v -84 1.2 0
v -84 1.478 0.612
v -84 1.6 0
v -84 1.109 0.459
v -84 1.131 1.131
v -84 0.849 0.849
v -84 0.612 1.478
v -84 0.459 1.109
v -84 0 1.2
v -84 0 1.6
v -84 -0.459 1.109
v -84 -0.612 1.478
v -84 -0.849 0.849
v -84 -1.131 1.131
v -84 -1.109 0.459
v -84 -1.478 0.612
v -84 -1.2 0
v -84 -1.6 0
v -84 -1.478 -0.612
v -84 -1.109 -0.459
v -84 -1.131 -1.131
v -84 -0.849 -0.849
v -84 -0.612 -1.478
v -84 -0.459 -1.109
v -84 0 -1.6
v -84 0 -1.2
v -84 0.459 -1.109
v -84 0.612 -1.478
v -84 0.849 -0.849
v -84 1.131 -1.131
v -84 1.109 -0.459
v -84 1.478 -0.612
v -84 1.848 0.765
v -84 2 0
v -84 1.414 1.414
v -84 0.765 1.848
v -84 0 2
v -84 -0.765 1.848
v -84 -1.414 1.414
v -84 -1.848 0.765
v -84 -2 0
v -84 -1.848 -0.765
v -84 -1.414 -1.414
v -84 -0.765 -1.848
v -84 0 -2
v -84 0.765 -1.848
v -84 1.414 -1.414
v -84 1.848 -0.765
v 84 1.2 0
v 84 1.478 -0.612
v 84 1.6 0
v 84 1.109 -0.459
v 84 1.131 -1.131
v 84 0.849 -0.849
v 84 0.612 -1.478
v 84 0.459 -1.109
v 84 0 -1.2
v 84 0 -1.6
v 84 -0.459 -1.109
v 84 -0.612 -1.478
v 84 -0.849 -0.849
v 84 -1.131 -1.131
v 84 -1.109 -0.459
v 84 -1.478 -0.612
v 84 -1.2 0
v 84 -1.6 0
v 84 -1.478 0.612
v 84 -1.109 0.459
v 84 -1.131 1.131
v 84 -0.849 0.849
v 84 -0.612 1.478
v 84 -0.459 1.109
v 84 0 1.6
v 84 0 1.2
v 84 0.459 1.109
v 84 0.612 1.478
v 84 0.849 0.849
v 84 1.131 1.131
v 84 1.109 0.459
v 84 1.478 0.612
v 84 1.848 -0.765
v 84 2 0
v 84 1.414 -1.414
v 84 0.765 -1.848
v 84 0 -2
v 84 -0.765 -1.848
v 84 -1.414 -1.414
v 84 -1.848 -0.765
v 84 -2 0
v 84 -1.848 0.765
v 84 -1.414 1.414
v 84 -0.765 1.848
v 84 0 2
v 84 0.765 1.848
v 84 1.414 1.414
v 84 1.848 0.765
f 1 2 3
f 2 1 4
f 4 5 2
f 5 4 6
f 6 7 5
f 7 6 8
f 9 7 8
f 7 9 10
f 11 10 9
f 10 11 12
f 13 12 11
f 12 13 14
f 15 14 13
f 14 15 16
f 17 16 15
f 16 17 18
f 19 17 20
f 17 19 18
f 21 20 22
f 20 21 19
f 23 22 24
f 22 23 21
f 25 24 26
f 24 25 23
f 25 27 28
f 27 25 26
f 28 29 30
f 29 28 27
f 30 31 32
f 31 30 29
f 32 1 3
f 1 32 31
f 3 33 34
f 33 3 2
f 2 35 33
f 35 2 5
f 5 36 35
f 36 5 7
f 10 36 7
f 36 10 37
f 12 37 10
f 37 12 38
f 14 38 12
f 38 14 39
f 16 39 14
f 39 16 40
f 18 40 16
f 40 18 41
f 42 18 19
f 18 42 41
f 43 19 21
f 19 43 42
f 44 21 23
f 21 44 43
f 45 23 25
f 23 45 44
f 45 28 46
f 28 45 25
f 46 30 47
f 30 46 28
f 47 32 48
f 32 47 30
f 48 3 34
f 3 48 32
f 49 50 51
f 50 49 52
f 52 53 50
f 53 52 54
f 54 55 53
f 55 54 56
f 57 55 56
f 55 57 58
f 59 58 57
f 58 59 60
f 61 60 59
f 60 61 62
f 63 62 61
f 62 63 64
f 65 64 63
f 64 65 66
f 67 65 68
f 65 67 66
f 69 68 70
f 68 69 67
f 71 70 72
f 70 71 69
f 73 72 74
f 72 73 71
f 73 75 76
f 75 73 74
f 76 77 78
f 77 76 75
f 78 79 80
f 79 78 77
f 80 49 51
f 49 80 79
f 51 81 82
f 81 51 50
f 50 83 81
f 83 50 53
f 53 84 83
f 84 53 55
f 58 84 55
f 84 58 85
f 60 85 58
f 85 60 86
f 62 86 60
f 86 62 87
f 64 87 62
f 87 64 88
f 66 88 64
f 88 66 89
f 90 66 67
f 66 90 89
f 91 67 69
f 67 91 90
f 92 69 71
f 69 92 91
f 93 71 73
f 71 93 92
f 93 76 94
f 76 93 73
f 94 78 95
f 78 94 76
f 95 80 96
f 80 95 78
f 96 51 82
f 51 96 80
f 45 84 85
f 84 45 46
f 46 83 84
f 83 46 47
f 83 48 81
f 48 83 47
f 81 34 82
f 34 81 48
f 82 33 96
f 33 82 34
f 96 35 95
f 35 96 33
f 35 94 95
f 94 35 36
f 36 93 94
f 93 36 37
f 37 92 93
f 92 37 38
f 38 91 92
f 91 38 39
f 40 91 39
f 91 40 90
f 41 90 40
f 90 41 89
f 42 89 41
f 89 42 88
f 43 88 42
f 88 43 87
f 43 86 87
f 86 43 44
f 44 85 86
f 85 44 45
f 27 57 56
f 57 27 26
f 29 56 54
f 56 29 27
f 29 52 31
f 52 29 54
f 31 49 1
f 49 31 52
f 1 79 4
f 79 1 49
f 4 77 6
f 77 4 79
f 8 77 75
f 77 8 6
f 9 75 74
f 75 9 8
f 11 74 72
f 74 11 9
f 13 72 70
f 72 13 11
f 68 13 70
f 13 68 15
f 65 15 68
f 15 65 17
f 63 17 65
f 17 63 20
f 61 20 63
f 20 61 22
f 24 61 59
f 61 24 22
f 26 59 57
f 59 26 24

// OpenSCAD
// file: ../p/4-4cyli.scad
use <../lib.scad>
function ldraw_lib__4_4cyli() = [
// 0 Cylinder 1.0
// 0 Name: 4-4cyli.dat
// 0 Author: James Jessiman
// 0 !LDRAW_ORG Primitive UPDATE 2005-01
// 0 !LICENSE Licensed under CC BY 2.0 and CC BY 4.0 : see CAreadme.txt
// 
// 0 BFC CERTIFY CCW
  [0,"BFC","CERTIFY"],
  [0,"BFC","CCW"],
// 
// 0 !HISTORY 1998-12-15 [PTadmin] Official Update 1998-10
// 0 !HISTORY 2002-03-23 [sbliss] Added BFC statement; merged headers from files in distributions LDraw 0.27 and Complete.
// 0 !HISTORY 2002-04-25 [PTadmin] Official Update 2002-02
// 0 !HISTORY 2004-12-14 [guyvivan] BFC CCW
// 0 !HISTORY 2005-12-28 [PTadmin] Official Update 2005-01
// 0 !HISTORY 2007-06-24 [PTadmin] Header formatted for Contributor Agreement
// 0 !HISTORY 2008-07-01 [PTadmin] Official Update 2008-01
// 
// 
// 4 16 1 1 0 0.9239 1 0.3827 0.9239 0 0.3827 1 0 0
  [4,16,1,1,0,0.9239,1,0.3827,0.9239,0,0.3827,1,0,0],
// 5 24 1 0 0 1 1 0 0.9239 0 0.3827 0.9239 0 -0.3827
  [5,24,1,0,0,1,1,0,0.9239,0,0.3827,0.9239,0,-0.3827],
// 4 16 0.9239 1 0.3827 0.7071 1 0.7071 0.7071 0 0.7071 0.9239 0 0.3827
  [4,16,0.9239,1,0.3827,0.7071,1,0.7071,0.7071,0,0.7071,0.9239,0,0.3827],
// 5 24 0.9239 0 0.3827 0.9239 1 0.3827 0.7071 0 0.7071 1 0 0
  [5,24,0.9239,0,0.3827,0.9239,1,0.3827,0.7071,0,0.7071,1,0,0],
// 4 16 0.7071 1 0.7071 0.3827 1 0.9239 0.3827 0 0.9239 0.7071 0 0.7071
  [4,16,0.7071,1,0.7071,0.3827,1,0.9239,0.3827,0,0.9239,0.7071,0,0.7071],
// 5 24 0.7071 0 0.7071 0.7071 1 0.7071 0.3827 0 0.9239 0.9239 0 0.3827
  [5,24,0.7071,0,0.7071,0.7071,1,0.7071,0.3827,0,0.9239,0.9239,0,0.3827],
// 4 16 0.3827 1 0.9239 0 1 1 0 0 1 0.3827 0 0.9239
  [4,16,0.3827,1,0.9239,0,1,1,0,0,1,0.3827,0,0.9239],
// 5 24 0.3827 0 0.9239 0.3827 1 0.9239 0 0 1 0.7071 0 0.7071
  [5,24,0.3827,0,0.9239,0.3827,1,0.9239,0,0,1,0.7071,0,0.7071],
// 4 16 0 1 1 -0.3827 1 0.9239 -0.3827 0 0.9239 0 0 1
  [4,16,0,1,1,-0.3827,1,0.9239,-0.3827,0,0.9239,0,0,1],
// 5 24 0 0 1 0 1 1 -0.3827 0 0.9239 0.3827 0 0.9239
  [5,24,0,0,1,0,1,1,-0.3827,0,0.9239,0.3827,0,0.9239],
// 4 16 -0.3827 1 0.9239 -0.7071 1 0.7071 -0.7071 0 0.7071 -0.3827 0 0.9239
  [4,16,-0.3827,1,0.9239,-0.7071,1,0.7071,-0.7071,0,0.7071,-0.3827,0,0.9239],
// 5 24 -0.3827 0 0.9239 -0.3827 1 0.9239 -0.7071 0 0.7071 0 0 1
  [5,24,-0.3827,0,0.9239,-0.3827,1,0.9239,-0.7071,0,0.7071,0,0,1],
// 4 16 -0.7071 1 0.7071 -0.9239 1 0.3827 -0.9239 0 0.3827 -0.7071 0 0.7071
  [4,16,-0.7071,1,0.7071,-0.9239,1,0.3827,-0.9239,0,0.3827,-0.7071,0,0.7071],
// 5 24 -0.7071 0 0.7071 -0.7071 1 0.7071 -0.9239 0 0.3827 -0.3827 0 0.9239
  [5,24,-0.7071,0,0.7071,-0.7071,1,0.7071,-0.9239,0,0.3827,-0.3827,0,0.9239],
// 4 16 -0.9239 1 0.3827 -1 1 0 -1 0 0 -0.9239 0 0.3827
  [4,16,-0.9239,1,0.3827,-1,1,0,-1,0,0,-0.9239,0,0.3827],
// 5 24 -0.9239 0 0.3827 -0.9239 1 0.3827 -1 0 0 -0.7071 0 0.7071
  [5,24,-0.9239,0,0.3827,-0.9239,1,0.3827,-1,0,0,-0.7071,0,0.7071],
// 4 16 -1 1 0 -0.9239 1 -0.3827 -0.9239 0 -0.3827 -1 0 0
  [4,16,-1,1,0,-0.9239,1,-0.3827,-0.9239,0,-0.3827,-1,0,0],
// 5 24 -1 0 0 -1 1 0 -0.9239 0 -0.3827 -0.9239 0 0.3827
  [5,24,-1,0,0,-1,1,0,-0.9239,0,-0.3827,-0.9239,0,0.3827],
// 4 16 -0.9239 1 -0.3827 -0.7071 1 -0.7071 -0.7071 0 -0.7071 -0.9239 0 -0.3827
  [4,16,-0.9239,1,-0.3827,-0.7071,1,-0.7071,-0.7071,0,-0.7071,-0.9239,0,-0.3827],
// 5 24 -0.9239 0 -0.3827 -0.9239 1 -0.3827 -0.7071 0 -0.7071 -1 0 0
  [5,24,-0.9239,0,-0.3827,-0.9239,1,-0.3827,-0.7071,0,-0.7071,-1,0,0],
// 4 16 -0.7071 1 -0.7071 -0.3827 1 -0.9239 -0.3827 0 -0.9239 -0.7071 0 -0.7071
  [4,16,-0.7071,1,-0.7071,-0.3827,1,-0.9239,-0.3827,0,-0.9239,-0.7071,0,-0.7071],
// 5 24 -0.7071 0 -0.7071 -0.7071 1 -0.7071 -0.3827 0 -0.9239 -0.9239 0 -0.3827
  [5,24,-0.7071,0,-0.7071,-0.7071,1,-0.7071,-0.3827,0,-0.9239,-0.9239,0,-0.3827],
// 4 16 -0.3827 1 -0.9239 0 1 -1 0 0 -1 -0.3827 0 -0.9239
  [4,16,-0.3827,1,-0.9239,0,1,-1,0,0,-1,-0.3827,0,-0.9239],
// 5 24 -0.3827 0 -0.9239 -0.3827 1 -0.9239 0 0 -1 -0.7071 0 -0.7071
  [5,24,-0.3827,0,-0.9239,-0.3827,1,-0.9239,0,0,-1,-0.7071,0,-0.7071],
// 4 16 0 1 -1 0.3827 1 -0.9239 0.3827 0 -0.9239 0 0 -1
  [4,16,0,1,-1,0.3827,1,-0.9239,0.3827,0,-0.9239,0,0,-1],
// 5 24 0 0 -1 0 1 -1 0.3827 0 -0.9239 -0.3827 0 -0.9239
  [5,24,0,0,-1,0,1,-1,0.3827,0,-0.9239,-0.3827,0,-0.9239],
// 4 16 0.3827 1 -0.9239 0.7071 1 -0.7071 0.7071 0 -0.7071 0.3827 0 -0.9239
  [4,16,0.3827,1,-0.9239,0.7071,1,-0.7071,0.7071,0,-0.7071,0.3827,0,-0.9239],
// 5 24 0.3827 0 -0.9239 0.3827 1 -0.9239 0.7071 0 -0.7071 0 0 -1
  [5,24,0.3827,0,-0.9239,0.3827,1,-0.9239,0.7071,0,-0.7071,0,0,-1],
// 4 16 0.7071 1 -0.7071 0.9239 1 -0.3827 0.9239 0 -0.3827 0.7071 0 -0.7071
  [4,16,0.7071,1,-0.7071,0.9239,1,-0.3827,0.9239,0,-0.3827,0.7071,0,-0.7071],
// 5 24 0.7071 0 -0.7071 0.7071 1 -0.7071 0.9239 0 -0.3827 0.3827 0 -0.9239
  [5,24,0.7071,0,-0.7071,0.7071,1,-0.7071,0.9239,0,-0.3827,0.3827,0,-0.9239],
// 4 16 0.9239 1 -0.3827 1 1 0 1 0 0 0.9239 0 -0.3827
  [4,16,0.9239,1,-0.3827,1,1,0,1,0,0,0.9239,0,-0.3827],
// 5 24 0.9239 0 -0.3827 0.9239 1 -0.3827 1 0 0 0.7071 0 -0.7071
  [5,24,0.9239,0,-0.3827,0.9239,1,-0.3827,1,0,0,0.7071,0,-0.7071],
// 0
];
module ldraw_lib__4_4cyli(step=0, col=false, unit=2/5, alt=false, line=0.2, solid=!$preview)
    makepoly(ldraw_lib__4_4cyli(), step=step, col=col, unit=unit, alt=alt, line=line, solid=solid);
ldraw_lib__4_4cyli(line=0.2);
// file: ../p/4-4ring4.scad
use <../lib.scad>
function ldraw_lib__4_4ring4() = [
// 0 Ring  4 x 1.0
// 0 Name: 4-4ring4.dat
// 0 Author: James Jessiman
// 0 !LDRAW_ORG Primitive UPDATE 2009-01
// 0 !LICENSE Licensed under CC BY 2.0 and CC BY 4.0 : see CAreadme.txt
// 
// 0 BFC CERTIFY CCW
  [0,"BFC","CERTIFY"],
  [0,"BFC","CCW"],
// 
// 0 !HISTORY 1998-12-15 [PTadmin] Official Update 1998-10
// 0 !HISTORY 2002-04-08 [BrickCaster] Modified for BFC compliance
// 0 !HISTORY 2002-04-25 [PTadmin] Official Update 2002-02
// 0 !HISTORY 2007-06-24 [PTadmin] Header formatted for Contributor Agreement
// 0 !HISTORY 2008-07-01 [PTadmin] Official Update 2008-01
// 0 !HISTORY 2008-08-26 [cwdee] Switch polygon winding and rename
// 0 !HISTORY 2009-05-02 [PTadmin] Official Update 2009-01
// 
// 
// 4 16 -1.9135 0 4.6195 -1.5308 0 3.6956 0 0 4 0 0 5
  [4,16,-1.9135,0,4.6195,-1.5308,0,3.6956,0,0,4,0,0,5],
// 4 16 -3.5355 0 3.5355 -2.8284 0 2.8284 -1.5308 0 3.6956 -1.9135 0 4.6195
  [4,16,-3.5355,0,3.5355,-2.8284,0,2.8284,-1.5308,0,3.6956,-1.9135,0,4.6195],
// 4 16 -4.6195 0 1.9135 -3.6956 0 1.5308 -2.8284 0 2.8284 -3.5355 0 3.5355
  [4,16,-4.6195,0,1.9135,-3.6956,0,1.5308,-2.8284,0,2.8284,-3.5355,0,3.5355],
// 4 16 -5 0 0 -4 0 0 -3.6956 0 1.5308 -4.6195 0 1.9135
  [4,16,-5,0,0,-4,0,0,-3.6956,0,1.5308,-4.6195,0,1.9135],
// 4 16 -4.6195 0 -1.9135 -3.6956 0 -1.5308 -4 0 0 -5 0 0
  [4,16,-4.6195,0,-1.9135,-3.6956,0,-1.5308,-4,0,0,-5,0,0],
// 4 16 -3.5355 0 -3.5355 -2.8284 0 -2.8284 -3.6956 0 -1.5308 -4.6195 0 -1.9135
  [4,16,-3.5355,0,-3.5355,-2.8284,0,-2.8284,-3.6956,0,-1.5308,-4.6195,0,-1.9135],
// 4 16 -1.9135 0 -4.6195 -1.5308 0 -3.6956 -2.8284 0 -2.8284 -3.5355 0 -3.5355
  [4,16,-1.9135,0,-4.6195,-1.5308,0,-3.6956,-2.8284,0,-2.8284,-3.5355,0,-3.5355],
// 4 16 0 0 -5 0 0 -4 -1.5308 0 -3.6956 -1.9135 0 -4.6195
  [4,16,0,0,-5,0,0,-4,-1.5308,0,-3.6956,-1.9135,0,-4.6195],
// 4 16 1.9135 0 -4.6195 1.5308 0 -3.6956 0 0 -4 0 0 -5
  [4,16,1.9135,0,-4.6195,1.5308,0,-3.6956,0,0,-4,0,0,-5],
// 4 16 3.5355 0 -3.5355 2.8284 0 -2.8284 1.5308 0 -3.6956 1.9135 0 -4.6195
  [4,16,3.5355,0,-3.5355,2.8284,0,-2.8284,1.5308,0,-3.6956,1.9135,0,-4.6195],
// 4 16 4.6195 0 -1.9135 3.6956 0 -1.5308 2.8284 0 -2.8284 3.5355 0 -3.5355
  [4,16,4.6195,0,-1.9135,3.6956,0,-1.5308,2.8284,0,-2.8284,3.5355,0,-3.5355],
// 4 16 5 0 0 4 0 0 3.6956 0 -1.5308 4.6195 0 -1.9135
  [4,16,5,0,0,4,0,0,3.6956,0,-1.5308,4.6195,0,-1.9135],
// 4 16 4.6195 0 1.9135 3.6956 0 1.5308 4 0 0 5 0 0
  [4,16,4.6195,0,1.9135,3.6956,0,1.5308,4,0,0,5,0,0],
// 4 16 3.5355 0 3.5355 2.8284 0 2.8284 3.6956 0 1.5308 4.6195 0 1.9135
  [4,16,3.5355,0,3.5355,2.8284,0,2.8284,3.6956,0,1.5308,4.6195,0,1.9135],
// 4 16 1.9135 0 4.6195 1.5308 0 3.6956 2.8284 0 2.8284 3.5355 0 3.5355
  [4,16,1.9135,0,4.6195,1.5308,0,3.6956,2.8284,0,2.8284,3.5355,0,3.5355],
// 4 16 0 0 5 0 0 4 1.5308 0 3.6956 1.9135 0 4.6195
  [4,16,0,0,5,0,0,4,1.5308,0,3.6956,1.9135,0,4.6195],
// 0
];
module ldraw_lib__4_4ring4(step=0, col=false, unit=2/5, alt=false, line=0.2, solid=!$preview)
    makepoly(ldraw_lib__4_4ring4(), step=step, col=col, unit=unit, alt=alt, line=line, solid=solid);
ldraw_lib__4_4ring4(line=0.2);
// file: ../p/4-4ring3.scad
use <../lib.scad>
function ldraw_lib__4_4ring3() = [
// 0 Ring  3 x 1.0
// 0 Name: 4-4ring3.dat
// 0 Author: James Jessiman
// 0 !LDRAW_ORG Primitive UPDATE 2009-01
// 0 !LICENSE Licensed under CC BY 2.0 and CC BY 4.0 : see CAreadme.txt
// 
// 0 BFC CERTIFY CCW
  [0,"BFC","CERTIFY"],
  [0,"BFC","CCW"],
// 
// 0 !HISTORY 1998-12-15 [PTadmin] Official Update 1998-10
// 0 !HISTORY 2002-04-05 [hafhead] Added BFC statement
// 0 !HISTORY 2002-04-25 [PTadmin] Official Update 2002-02
// 0 !HISTORY 2007-06-24 [PTadmin] Header formatted for Contributor Agreement
// 0 !HISTORY 2008-07-01 [PTadmin] Official Update 2008-01
// 0 !HISTORY 2008-08-26 [cwdee] Switch polygon winding and rename
// 0 !HISTORY 2009-05-02 [PTadmin] Official Update 2009-01
// 
// 
// 4 16 -1.5308 0 3.6956 -1.1481 0 2.7717 0 0 3 0 0 4
  [4,16,-1.5308,0,3.6956,-1.1481,0,2.7717,0,0,3,0,0,4],
// 4 16 -2.8284 0 2.8284 -2.1213 0 2.1213 -1.1481 0 2.7717 -1.5308 0 3.6956
  [4,16,-2.8284,0,2.8284,-2.1213,0,2.1213,-1.1481,0,2.7717,-1.5308,0,3.6956],
// 4 16 -3.6956 0 1.5308 -2.7717 0 1.1481 -2.1213 0 2.1213 -2.8284 0 2.8284
  [4,16,-3.6956,0,1.5308,-2.7717,0,1.1481,-2.1213,0,2.1213,-2.8284,0,2.8284],
// 4 16 -4 0 0 -3 0 0 -2.7717 0 1.1481 -3.6956 0 1.5308
  [4,16,-4,0,0,-3,0,0,-2.7717,0,1.1481,-3.6956,0,1.5308],
// 4 16 -3.6956 0 -1.5308 -2.7717 0 -1.1481 -3 0 0 -4 0 0
  [4,16,-3.6956,0,-1.5308,-2.7717,0,-1.1481,-3,0,0,-4,0,0],
// 4 16 -2.8284 0 -2.8284 -2.1213 0 -2.1213 -2.7717 0 -1.1481 -3.6956 0 -1.5308
  [4,16,-2.8284,0,-2.8284,-2.1213,0,-2.1213,-2.7717,0,-1.1481,-3.6956,0,-1.5308],
// 4 16 -1.5308 0 -3.6956 -1.1481 0 -2.7717 -2.1213 0 -2.1213 -2.8284 0 -2.8284
  [4,16,-1.5308,0,-3.6956,-1.1481,0,-2.7717,-2.1213,0,-2.1213,-2.8284,0,-2.8284],
// 4 16 0 0 -4 0 0 -3 -1.1481 0 -2.7717 -1.5308 0 -3.6956
  [4,16,0,0,-4,0,0,-3,-1.1481,0,-2.7717,-1.5308,0,-3.6956],
// 4 16 1.5308 0 -3.6956 1.1481 0 -2.7717 0 0 -3 0 0 -4
  [4,16,1.5308,0,-3.6956,1.1481,0,-2.7717,0,0,-3,0,0,-4],
// 4 16 2.8284 0 -2.8284 2.1213 0 -2.1213 1.1481 0 -2.7717 1.5308 0 -3.6956
  [4,16,2.8284,0,-2.8284,2.1213,0,-2.1213,1.1481,0,-2.7717,1.5308,0,-3.6956],
// 4 16 3.6956 0 -1.5308 2.7717 0 -1.1481 2.1213 0 -2.1213 2.8284 0 -2.8284
  [4,16,3.6956,0,-1.5308,2.7717,0,-1.1481,2.1213,0,-2.1213,2.8284,0,-2.8284],
// 4 16 4 0 0 3 0 0 2.7717 0 -1.1481 3.6956 0 -1.5308
  [4,16,4,0,0,3,0,0,2.7717,0,-1.1481,3.6956,0,-1.5308],
// 4 16 3.6956 0 1.5308 2.7717 0 1.1481 3 0 0 4 0 0
  [4,16,3.6956,0,1.5308,2.7717,0,1.1481,3,0,0,4,0,0],
// 4 16 2.8284 0 2.8284 2.1213 0 2.1213 2.7717 0 1.1481 3.6956 0 1.5308
  [4,16,2.8284,0,2.8284,2.1213,0,2.1213,2.7717,0,1.1481,3.6956,0,1.5308],
// 4 16 1.5308 0 3.6956 1.1481 0 2.7717 2.1213 0 2.1213 2.8284 0 2.8284
  [4,16,1.5308,0,3.6956,1.1481,0,2.7717,2.1213,0,2.1213,2.8284,0,2.8284],
// 4 16 0 0 4 0 0 3 1.1481 0 2.7717 1.5308 0 3.6956
  [4,16,0,0,4,0,0,3,1.1481,0,2.7717,1.5308,0,3.6956],
// 0
];
module ldraw_lib__4_4ring3(step=0, col=false, unit=2/5, alt=false, line=0.2, solid=!$preview)
    makepoly(ldraw_lib__4_4ring3(), step=step, col=col, unit=unit, alt=alt, line=line, solid=solid);
ldraw_lib__4_4ring3(line=0.2);
// file: ../p/4-4edge.scad
use <../lib.scad>
function ldraw_lib__4_4edge() = [
// 0 Circle 1.0
// 0 Name: 4-4edge.dat
// 0 Author: James Jessiman
// 0 !LDRAW_ORG Primitive UPDATE 2017-01
// 0 !LICENSE Licensed under CC BY 4.0 : see CAreadme.txt
// 
// 0 BFC CERTIFY CCW
  [0,"BFC","CERTIFY"],
  [0,"BFC","CCW"],
// 
// 0 !HISTORY 1998-12-15 [PTadmin] Official Update 1998-10
// 0 !HISTORY 2005-12-28 [PTadmin] Official Update 2005-01
// 0 !HISTORY 2007-06-24 [PTadmin] Header formatted for Contributor Agreement
// 0 !HISTORY 2008-07-01 [PTadmin] Official Update 2008-01
// 0 !HISTORY 2017-01-15 [Steffen] BFCed
// 0 !HISTORY 2017-12-30 [PTadmin] Official Update 2017-01
// 
// 
// 2 24 1 0 0 0.9239 0 0.3827
  [2,24,1,0,0,0.9239,0,0.3827],
// 2 24 0.9239 0 0.3827 0.7071 0 0.7071
  [2,24,0.9239,0,0.3827,0.7071,0,0.7071],
// 2 24 0.7071 0 0.7071 0.3827 0 0.9239
  [2,24,0.7071,0,0.7071,0.3827,0,0.9239],
// 2 24 0.3827 0 0.9239 0 0 1
  [2,24,0.3827,0,0.9239,0,0,1],
// 2 24 0 0 1 -0.3827 0 0.9239
  [2,24,0,0,1,-0.3827,0,0.9239],
// 2 24 -0.3827 0 0.9239 -0.7071 0 0.7071
  [2,24,-0.3827,0,0.9239,-0.7071,0,0.7071],
// 2 24 -0.7071 0 0.7071 -0.9239 0 0.3827
  [2,24,-0.7071,0,0.7071,-0.9239,0,0.3827],
// 2 24 -0.9239 0 0.3827 -1 0 -0
  [2,24,-0.9239,0,0.3827,-1,0,-0],
// 2 24 -1 0 -0 -0.9239 0 -0.3827
  [2,24,-1,0,-0,-0.9239,0,-0.3827],
// 2 24 -0.9239 0 -0.3827 -0.7071 0 -0.7071
  [2,24,-0.9239,0,-0.3827,-0.7071,0,-0.7071],
// 2 24 -0.7071 0 -0.7071 -0.3827 0 -0.9239
  [2,24,-0.7071,0,-0.7071,-0.3827,0,-0.9239],
// 2 24 -0.3827 0 -0.9239 0 0 -1
  [2,24,-0.3827,0,-0.9239,0,0,-1],
// 2 24 0 0 -1 0.3827 0 -0.9239
  [2,24,0,0,-1,0.3827,0,-0.9239],
// 2 24 0.3827 0 -0.9239 0.7071 0 -0.7071
  [2,24,0.3827,0,-0.9239,0.7071,0,-0.7071],
// 2 24 0.7071 0 -0.7071 0.9239 0 -0.3827
  [2,24,0.7071,0,-0.7071,0.9239,0,-0.3827],
// 2 24 0.9239 0 -0.3827 1 0 0
  [2,24,0.9239,0,-0.3827,1,0,0],
];
module ldraw_lib__4_4edge(step=0, col=false, unit=2/5, alt=false, line=0.2, solid=!$preview)
    makepoly(ldraw_lib__4_4edge(), step=step, col=col, unit=unit, alt=alt, line=line, solid=solid);
ldraw_lib__4_4edge(line=0.2);
// file: 71533k03.scad
use <../lib.scad>
use <../p/4-4cyli.scad>
function ldraw_lib__71533k03() = [
// 0 ~Technic Pneumatic Tube Segment
// 0 Name: 71533k03.dat
// 0 Author: Jaco van der Molen [Jaco]
// 0 !LDRAW_ORG Part Flexible_Section UPDATE 2020-01
// 0 !LICENSE Licensed under CC BY 4.0 : see CAreadme.txt
// 
// 0 BFC CERTIFY CW
  [0,"BFC","CERTIFY"],
  [0,"BFC","CW"],
// 
// 0 !HISTORY 2003-11-30 [Steffen] BFCed
// 0 !HISTORY 2009-12-29 [PTadmin] Official Update 2009-03
// 0 !HISTORY 2020-06-27 [PTadmin] Renamed from 166
// 0 !HISTORY 2020-06-28 [PTadmin] Official Update 2020-01
// 
// 
// 1 16 0 0 0 5 0 0 0 1 0 0 0 5 4-4cyli.dat
  [1,16,0,0,0,5,0,0,0,1,0,0,0,5, ldraw_lib__4_4cyli()],
// 0 BFC INVERTNEXT
  [0,"BFC","INVERTNEXT"],
// 1 16 0 0 0 3 0 0 0 1 0 0 0 3 4-4cyli.dat
  [1,16,0,0,0,3,0,0,0,1,0,0,0,3, ldraw_lib__4_4cyli()],
// 0
];
module ldraw_lib__71533k03(step=0, col=false, unit=2/5, alt=false, line=0.2, solid=!$preview)
    makepoly(ldraw_lib__71533k03(), step=step, col=col, unit=unit, alt=alt, line=line, solid=solid);
ldraw_lib__71533k03(line=0.2);
// file: 71533k02.scad
use <../lib.scad>
use <../p/4-4edge.scad>
use <../p/4-4ring3.scad>
use <../p/4-4ring4.scad>
function ldraw_lib__71533k02() = [
// 0 ~Technic Pneumatic Tube End (Non-Bulged)
// 0 Name: 71533k02.dat
// 0 Author: Steffen [Steffen]
// 0 !LDRAW_ORG Part Flexible_Section UPDATE 2020-01
// 0 !LICENSE Licensed under CC BY 4.0 : see CAreadme.txt
// 
// 0 BFC CERTIFY CCW
  [0,"BFC","CERTIFY"],
  [0,"BFC","CCW"],
// 
// 0 !HISTORY 2020-06-28 [PTadmin] Official Update 2020-01
// 
// 
// 0 // This file goes together with 71533k01.dat and 71533k03.dat.
// 0 // Those 3 files can be used to create Technic Pneumatic Tubes
// 0 // with either bulged or non-bulged ends.
// 
// 1 16 0 0 0 1 0 0 0 1 0 0 0 1 4-4ring3.dat
  [1,16,0,0,0,1,0,0,0,1,0,0,0,1, ldraw_lib__4_4ring3()],
// 1 16 0 0 0 1 0 0 0 1 0 0 0 1 4-4ring4.dat
  [1,16,0,0,0,1,0,0,0,1,0,0,0,1, ldraw_lib__4_4ring4()],
// 1 16 0 0 0 3 0 0 0 3 0 0 0 3 4-4edge.dat
  [1,16,0,0,0,3,0,0,0,3,0,0,0,3, ldraw_lib__4_4edge()],
// 1 16 0 0 0 5 0 0 0 5 0 0 0 5 4-4edge.dat
  [1,16,0,0,0,5,0,0,0,5,0,0,0,5, ldraw_lib__4_4edge()],
];
module ldraw_lib__71533k02(step=0, col=false, unit=2/5, alt=false, line=0.2, solid=!$preview)
    makepoly(ldraw_lib__71533k02(), step=step, col=col, unit=unit, alt=alt, line=line, solid=solid);
ldraw_lib__71533k02(line=0.2);
// main file
use <../lib.scad>
use <71533k02.scad>
use <71533k03.scad>
function ldraw_lib__53184_f1() = [
// 0 Technic Pneumatic Tube 21L
// 0 Name: 53184-f1.dat
// 0 Author: Philippe Hurbain [Philo]
// 0 !LDRAW_ORG Part UPDATE 2020-02
// 0 !LICENSE Licensed under CC BY 4.0 : see CAreadme.txt
// 
// 0 BFC CERTIFY CCW
  [0,"BFC","CERTIFY"],
  [0,"BFC","CCW"],
// 
// 0 !KEYWORDS 168 mm
// 
// 0 !HISTORY 2020-09-05 [PTadmin] Official Update 2020-02
// 
// 
// 1 16 -210 0 0 0 1 0 1 0 0 0 0 1 71533k02.dat
  [1,16,-210,0,0,0,1,0,1,0,0,0,0,1, ldraw_lib__71533k02()],
// 1 16 210 0 0 0 -1 0 -1 0 0 0 0 1 71533k02.dat
  [1,16,210,0,0,0,-1,0,-1,0,0,0,0,1, ldraw_lib__71533k02()],
// 1 16 -210 0 0 0 420 0 1 0 0 0 0 1 71533k03.dat
  [1,16,-210,0,0,0,420,0,1,0,0,0,0,1, ldraw_lib__71533k03()],
];
module ldraw_lib__53184_f1(step=0, col=false, unit=2/5, alt=false, line=0.2, solid=!$preview)
    makepoly(ldraw_lib__53184_f1(), step=step, col=col, unit=unit, alt=alt, line=line, solid=solid);
ldraw_lib__53184_f1(line=0.2);
